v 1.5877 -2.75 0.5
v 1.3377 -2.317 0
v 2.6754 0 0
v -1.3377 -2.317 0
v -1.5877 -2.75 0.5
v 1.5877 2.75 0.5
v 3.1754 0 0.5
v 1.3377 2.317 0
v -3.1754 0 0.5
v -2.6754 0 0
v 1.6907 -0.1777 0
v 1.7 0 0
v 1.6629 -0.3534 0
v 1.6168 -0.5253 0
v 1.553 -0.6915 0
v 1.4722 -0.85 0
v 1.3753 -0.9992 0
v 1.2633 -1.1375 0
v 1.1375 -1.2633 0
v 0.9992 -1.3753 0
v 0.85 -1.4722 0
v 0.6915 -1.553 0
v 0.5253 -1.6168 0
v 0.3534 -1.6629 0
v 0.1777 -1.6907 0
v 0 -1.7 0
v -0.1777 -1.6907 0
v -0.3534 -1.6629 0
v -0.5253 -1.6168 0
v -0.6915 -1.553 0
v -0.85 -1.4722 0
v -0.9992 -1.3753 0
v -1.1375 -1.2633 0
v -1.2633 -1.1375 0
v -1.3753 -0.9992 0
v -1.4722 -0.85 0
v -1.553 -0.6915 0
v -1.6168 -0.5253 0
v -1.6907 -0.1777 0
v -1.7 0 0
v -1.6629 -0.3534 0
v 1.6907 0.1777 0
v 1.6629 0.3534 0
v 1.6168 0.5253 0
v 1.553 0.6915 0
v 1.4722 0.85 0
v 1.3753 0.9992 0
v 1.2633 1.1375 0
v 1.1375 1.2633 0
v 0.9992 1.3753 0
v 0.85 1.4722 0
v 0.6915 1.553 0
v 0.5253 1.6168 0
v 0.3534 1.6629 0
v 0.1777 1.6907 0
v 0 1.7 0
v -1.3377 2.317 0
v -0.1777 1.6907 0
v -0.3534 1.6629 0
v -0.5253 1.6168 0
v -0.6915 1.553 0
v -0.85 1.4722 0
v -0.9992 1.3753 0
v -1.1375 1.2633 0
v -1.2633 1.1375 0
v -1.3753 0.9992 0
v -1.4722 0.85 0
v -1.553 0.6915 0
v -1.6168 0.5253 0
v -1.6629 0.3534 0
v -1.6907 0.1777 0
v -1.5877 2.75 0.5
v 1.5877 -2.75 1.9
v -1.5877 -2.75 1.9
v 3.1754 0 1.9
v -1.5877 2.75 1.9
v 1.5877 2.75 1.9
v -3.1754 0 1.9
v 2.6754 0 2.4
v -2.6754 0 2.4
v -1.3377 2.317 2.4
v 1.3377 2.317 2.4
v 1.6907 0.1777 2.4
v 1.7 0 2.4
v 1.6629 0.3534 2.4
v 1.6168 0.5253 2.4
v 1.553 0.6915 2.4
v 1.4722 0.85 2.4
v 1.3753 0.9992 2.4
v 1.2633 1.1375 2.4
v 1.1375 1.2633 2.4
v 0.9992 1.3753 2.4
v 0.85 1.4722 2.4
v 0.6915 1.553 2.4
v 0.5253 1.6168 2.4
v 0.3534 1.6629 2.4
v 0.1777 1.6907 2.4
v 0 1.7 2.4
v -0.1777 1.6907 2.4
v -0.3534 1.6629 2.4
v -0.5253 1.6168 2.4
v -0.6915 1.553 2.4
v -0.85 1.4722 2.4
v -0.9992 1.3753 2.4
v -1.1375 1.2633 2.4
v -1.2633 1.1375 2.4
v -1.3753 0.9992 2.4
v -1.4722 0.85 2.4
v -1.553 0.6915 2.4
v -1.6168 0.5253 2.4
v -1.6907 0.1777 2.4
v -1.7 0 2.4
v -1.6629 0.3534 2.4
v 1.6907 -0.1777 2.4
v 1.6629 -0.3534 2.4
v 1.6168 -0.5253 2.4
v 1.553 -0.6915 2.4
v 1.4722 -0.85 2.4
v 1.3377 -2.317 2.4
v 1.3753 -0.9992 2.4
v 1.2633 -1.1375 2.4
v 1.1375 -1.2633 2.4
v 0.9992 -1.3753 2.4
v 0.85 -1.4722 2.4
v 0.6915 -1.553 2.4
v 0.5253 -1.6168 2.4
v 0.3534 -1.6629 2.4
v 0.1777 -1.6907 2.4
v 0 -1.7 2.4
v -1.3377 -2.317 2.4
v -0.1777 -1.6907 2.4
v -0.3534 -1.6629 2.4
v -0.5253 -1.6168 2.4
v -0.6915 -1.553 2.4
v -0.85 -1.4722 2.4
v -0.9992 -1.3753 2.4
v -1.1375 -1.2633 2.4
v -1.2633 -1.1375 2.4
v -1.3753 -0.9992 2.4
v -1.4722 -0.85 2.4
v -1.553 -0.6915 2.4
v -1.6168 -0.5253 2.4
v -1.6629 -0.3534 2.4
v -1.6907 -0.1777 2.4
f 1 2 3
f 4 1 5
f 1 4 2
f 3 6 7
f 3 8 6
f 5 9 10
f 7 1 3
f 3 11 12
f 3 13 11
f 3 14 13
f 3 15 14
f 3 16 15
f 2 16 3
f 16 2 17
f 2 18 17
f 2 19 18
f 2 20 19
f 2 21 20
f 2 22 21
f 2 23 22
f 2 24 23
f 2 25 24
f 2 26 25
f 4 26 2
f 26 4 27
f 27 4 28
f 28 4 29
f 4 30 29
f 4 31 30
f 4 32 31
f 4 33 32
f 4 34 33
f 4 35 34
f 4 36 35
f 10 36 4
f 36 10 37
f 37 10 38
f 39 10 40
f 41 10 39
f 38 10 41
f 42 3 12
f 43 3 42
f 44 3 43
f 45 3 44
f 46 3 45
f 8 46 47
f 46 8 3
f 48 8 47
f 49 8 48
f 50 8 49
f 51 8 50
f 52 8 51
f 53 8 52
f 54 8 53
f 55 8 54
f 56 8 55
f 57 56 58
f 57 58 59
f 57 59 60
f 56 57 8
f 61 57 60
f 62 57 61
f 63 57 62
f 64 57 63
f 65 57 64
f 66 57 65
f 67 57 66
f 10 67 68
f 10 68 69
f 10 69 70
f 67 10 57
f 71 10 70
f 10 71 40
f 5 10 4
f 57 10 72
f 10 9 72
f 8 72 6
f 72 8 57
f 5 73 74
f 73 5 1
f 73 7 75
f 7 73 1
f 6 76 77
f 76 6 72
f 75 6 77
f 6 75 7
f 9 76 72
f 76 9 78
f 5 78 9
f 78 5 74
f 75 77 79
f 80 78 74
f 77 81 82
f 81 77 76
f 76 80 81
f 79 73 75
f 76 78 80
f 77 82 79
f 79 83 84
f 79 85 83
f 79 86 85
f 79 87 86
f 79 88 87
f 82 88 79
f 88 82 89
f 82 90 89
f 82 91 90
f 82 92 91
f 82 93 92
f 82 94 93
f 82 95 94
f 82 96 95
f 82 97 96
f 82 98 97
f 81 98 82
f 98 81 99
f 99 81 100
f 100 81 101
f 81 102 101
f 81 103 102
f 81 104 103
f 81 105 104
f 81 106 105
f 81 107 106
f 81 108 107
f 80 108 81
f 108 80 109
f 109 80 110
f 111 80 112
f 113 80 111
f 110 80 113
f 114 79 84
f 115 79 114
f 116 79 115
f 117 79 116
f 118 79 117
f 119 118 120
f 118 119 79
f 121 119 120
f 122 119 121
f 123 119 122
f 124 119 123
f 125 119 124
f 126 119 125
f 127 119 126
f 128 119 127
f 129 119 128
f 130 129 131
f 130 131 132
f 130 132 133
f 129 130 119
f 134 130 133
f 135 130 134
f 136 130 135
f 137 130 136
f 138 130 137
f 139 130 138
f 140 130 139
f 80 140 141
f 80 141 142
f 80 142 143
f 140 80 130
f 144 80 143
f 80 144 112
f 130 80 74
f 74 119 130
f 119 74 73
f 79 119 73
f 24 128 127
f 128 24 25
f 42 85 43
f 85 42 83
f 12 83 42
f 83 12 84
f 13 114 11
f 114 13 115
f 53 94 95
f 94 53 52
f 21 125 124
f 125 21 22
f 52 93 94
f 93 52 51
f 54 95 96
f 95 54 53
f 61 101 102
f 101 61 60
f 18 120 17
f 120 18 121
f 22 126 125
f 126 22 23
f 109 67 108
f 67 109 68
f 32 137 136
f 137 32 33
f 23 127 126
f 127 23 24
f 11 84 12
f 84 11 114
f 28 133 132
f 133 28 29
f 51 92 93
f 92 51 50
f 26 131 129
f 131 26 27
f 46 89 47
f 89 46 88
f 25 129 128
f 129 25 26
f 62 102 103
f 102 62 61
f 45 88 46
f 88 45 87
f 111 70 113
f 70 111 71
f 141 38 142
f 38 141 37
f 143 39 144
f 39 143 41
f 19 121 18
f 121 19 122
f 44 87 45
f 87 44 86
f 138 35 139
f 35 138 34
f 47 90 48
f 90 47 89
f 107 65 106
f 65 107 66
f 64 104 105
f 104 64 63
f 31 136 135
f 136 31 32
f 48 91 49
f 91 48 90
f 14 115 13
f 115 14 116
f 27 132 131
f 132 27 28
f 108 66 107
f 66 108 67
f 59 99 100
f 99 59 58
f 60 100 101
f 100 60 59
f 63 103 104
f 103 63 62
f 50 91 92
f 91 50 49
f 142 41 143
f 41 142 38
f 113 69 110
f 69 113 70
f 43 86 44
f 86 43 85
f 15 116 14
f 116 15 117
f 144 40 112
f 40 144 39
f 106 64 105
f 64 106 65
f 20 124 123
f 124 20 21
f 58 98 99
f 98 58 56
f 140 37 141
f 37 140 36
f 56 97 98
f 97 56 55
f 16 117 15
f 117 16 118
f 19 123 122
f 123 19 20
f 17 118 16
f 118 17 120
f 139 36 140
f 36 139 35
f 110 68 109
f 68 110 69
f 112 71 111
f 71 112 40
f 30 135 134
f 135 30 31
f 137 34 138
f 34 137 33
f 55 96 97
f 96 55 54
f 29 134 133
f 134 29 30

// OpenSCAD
// Through hex nut.
$fn = 60;
eps = 0.02;
thread_clearance_d = 3.4;
flat = 5.5;
thickness = 2.4;
chamfer = 0.5;
difference() {
    union() {
        cylinder(d1 = flat / cos(30) - 2 * chamfer, d2 = flat / cos(30), h = chamfer, $fn = 6);
        translate([0, 0, chamfer]) cylinder(d = flat / cos(30), h = thickness - 2 * chamfer, $fn = 6);
        translate([0, 0, thickness - chamfer]) cylinder(d1 = flat / cos(30), d2 = flat / cos(30) - 2 * chamfer, h = chamfer, $fn = 6);
    }
    translate([0, 0, -eps]) cylinder(d = thread_clearance_d, h = thickness + 2 * eps);
}
